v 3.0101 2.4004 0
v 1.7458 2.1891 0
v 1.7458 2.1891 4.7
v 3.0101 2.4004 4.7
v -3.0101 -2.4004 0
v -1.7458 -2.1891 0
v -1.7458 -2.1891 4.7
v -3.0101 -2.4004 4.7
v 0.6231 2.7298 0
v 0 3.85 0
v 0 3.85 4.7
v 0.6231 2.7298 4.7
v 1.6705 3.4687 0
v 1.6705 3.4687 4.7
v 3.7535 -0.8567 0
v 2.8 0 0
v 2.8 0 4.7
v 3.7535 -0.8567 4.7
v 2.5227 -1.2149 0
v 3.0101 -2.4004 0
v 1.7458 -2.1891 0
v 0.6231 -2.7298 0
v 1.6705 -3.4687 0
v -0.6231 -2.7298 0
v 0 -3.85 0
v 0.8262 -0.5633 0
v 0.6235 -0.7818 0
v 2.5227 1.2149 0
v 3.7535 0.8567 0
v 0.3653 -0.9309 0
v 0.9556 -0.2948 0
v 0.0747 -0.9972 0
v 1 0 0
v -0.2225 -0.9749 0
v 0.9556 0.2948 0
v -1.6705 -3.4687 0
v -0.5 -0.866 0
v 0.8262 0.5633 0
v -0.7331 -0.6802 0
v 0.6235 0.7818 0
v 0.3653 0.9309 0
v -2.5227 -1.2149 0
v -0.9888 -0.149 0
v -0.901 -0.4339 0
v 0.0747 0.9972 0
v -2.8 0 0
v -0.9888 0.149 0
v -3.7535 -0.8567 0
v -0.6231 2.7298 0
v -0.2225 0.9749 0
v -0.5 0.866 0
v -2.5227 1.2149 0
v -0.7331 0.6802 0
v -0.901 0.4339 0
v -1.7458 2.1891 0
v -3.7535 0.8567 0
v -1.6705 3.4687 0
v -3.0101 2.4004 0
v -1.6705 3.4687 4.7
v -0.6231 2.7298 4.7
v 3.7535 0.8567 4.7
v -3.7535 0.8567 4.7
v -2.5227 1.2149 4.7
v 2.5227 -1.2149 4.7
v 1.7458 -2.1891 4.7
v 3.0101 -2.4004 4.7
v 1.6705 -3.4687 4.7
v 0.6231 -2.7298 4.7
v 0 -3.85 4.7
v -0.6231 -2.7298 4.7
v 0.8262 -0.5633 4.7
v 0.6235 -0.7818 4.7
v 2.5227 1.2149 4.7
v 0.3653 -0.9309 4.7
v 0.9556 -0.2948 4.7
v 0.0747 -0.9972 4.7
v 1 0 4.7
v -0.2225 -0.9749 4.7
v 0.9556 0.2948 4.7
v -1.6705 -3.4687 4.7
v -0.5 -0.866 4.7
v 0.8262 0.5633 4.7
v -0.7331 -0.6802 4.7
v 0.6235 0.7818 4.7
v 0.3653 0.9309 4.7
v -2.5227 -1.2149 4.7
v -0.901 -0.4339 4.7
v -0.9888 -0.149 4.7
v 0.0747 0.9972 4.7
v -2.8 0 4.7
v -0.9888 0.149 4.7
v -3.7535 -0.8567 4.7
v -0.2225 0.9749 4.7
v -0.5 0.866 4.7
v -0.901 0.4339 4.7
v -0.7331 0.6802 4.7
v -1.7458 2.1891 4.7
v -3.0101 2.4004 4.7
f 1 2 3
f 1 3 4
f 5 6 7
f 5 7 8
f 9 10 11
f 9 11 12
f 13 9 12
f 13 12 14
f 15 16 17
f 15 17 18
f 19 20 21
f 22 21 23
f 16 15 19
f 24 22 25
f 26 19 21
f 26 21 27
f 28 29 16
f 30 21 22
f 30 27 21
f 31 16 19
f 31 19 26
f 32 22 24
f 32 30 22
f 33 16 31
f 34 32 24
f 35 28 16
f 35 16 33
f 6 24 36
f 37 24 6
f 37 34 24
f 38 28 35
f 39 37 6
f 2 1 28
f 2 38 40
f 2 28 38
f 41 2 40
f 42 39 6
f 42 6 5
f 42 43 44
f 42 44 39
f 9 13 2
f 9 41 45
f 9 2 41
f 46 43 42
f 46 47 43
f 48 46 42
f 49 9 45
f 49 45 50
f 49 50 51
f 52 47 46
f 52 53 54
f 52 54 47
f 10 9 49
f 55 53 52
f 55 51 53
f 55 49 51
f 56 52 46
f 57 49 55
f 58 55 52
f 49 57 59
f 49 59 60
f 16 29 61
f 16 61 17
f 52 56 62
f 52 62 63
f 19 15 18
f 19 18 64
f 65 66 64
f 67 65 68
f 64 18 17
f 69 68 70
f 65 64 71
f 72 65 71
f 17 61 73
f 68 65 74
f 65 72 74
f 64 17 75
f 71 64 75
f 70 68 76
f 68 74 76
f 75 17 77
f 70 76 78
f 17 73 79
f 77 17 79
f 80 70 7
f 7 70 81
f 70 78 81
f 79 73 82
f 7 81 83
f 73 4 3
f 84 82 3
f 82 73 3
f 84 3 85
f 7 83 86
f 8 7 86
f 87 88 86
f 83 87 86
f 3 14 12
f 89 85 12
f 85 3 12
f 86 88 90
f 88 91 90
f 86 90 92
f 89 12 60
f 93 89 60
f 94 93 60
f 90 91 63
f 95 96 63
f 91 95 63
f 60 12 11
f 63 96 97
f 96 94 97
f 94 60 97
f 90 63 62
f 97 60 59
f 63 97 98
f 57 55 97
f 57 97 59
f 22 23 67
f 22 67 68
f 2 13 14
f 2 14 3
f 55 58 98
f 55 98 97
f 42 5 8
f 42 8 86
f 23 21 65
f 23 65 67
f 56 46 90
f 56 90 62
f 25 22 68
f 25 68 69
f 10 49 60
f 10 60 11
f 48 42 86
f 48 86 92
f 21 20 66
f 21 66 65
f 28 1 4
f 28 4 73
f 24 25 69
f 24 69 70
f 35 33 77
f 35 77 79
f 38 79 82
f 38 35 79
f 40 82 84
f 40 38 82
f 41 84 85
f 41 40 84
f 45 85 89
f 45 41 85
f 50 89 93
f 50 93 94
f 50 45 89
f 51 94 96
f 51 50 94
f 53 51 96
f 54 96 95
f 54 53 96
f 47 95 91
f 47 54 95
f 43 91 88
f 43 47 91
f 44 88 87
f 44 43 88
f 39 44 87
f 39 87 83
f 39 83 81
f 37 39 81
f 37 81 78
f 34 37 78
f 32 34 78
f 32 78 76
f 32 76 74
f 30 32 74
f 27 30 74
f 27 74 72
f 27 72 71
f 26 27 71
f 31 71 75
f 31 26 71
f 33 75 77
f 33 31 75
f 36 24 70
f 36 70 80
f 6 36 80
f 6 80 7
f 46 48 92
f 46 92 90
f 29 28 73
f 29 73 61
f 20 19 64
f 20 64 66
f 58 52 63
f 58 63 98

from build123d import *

# Parameters (mm, degrees)
SKETCH1_R           = 1
BOSS_EXTRUDE1_DEPTH = 4.7


with BuildPart() as part:
    # Sketch1 → Boss-Extrude1 (new body)
    with BuildSketch(Plane.XY):
        Polygon((0, 3.85), (0.623058615, 2.729798154), (1.670452396, 3.468730141), (1.745771445, 2.189128151), (3.010051208, 2.400435737), (2.52271283, 1.21487447), (3.753472462, 0.856705596), (2.8, 0), (3.753472462, -0.856705596), (2.52271283, -1.21487447), (3.010051208, -2.400435737), (1.745771445, -2.189128151), (1.670452396, -3.468730141), (0.623058615, -2.729798154), (0, -3.85), (-0.623058615, -2.729798154), (-1.670452396, -3.468730141), (-1.745771445, -2.189128151), (-3.010051208, -2.400435737), (-2.52271283, -1.21487447), (-3.753472462, -0.856705596), (-2.8, 0), (-3.753472462, 0.856705596), (-2.52271283, 1.21487447), (-3.010051208, 2.400435737), (-1.745771445, 2.189128151), (-1.670452396, 3.468730141), (-0.623058615, 2.729798154), align=None)
        Circle(SKETCH1_R, mode=Mode.SUBTRACT)
    extrude(amount=BOSS_EXTRUDE1_DEPTH)


solid = part.part
